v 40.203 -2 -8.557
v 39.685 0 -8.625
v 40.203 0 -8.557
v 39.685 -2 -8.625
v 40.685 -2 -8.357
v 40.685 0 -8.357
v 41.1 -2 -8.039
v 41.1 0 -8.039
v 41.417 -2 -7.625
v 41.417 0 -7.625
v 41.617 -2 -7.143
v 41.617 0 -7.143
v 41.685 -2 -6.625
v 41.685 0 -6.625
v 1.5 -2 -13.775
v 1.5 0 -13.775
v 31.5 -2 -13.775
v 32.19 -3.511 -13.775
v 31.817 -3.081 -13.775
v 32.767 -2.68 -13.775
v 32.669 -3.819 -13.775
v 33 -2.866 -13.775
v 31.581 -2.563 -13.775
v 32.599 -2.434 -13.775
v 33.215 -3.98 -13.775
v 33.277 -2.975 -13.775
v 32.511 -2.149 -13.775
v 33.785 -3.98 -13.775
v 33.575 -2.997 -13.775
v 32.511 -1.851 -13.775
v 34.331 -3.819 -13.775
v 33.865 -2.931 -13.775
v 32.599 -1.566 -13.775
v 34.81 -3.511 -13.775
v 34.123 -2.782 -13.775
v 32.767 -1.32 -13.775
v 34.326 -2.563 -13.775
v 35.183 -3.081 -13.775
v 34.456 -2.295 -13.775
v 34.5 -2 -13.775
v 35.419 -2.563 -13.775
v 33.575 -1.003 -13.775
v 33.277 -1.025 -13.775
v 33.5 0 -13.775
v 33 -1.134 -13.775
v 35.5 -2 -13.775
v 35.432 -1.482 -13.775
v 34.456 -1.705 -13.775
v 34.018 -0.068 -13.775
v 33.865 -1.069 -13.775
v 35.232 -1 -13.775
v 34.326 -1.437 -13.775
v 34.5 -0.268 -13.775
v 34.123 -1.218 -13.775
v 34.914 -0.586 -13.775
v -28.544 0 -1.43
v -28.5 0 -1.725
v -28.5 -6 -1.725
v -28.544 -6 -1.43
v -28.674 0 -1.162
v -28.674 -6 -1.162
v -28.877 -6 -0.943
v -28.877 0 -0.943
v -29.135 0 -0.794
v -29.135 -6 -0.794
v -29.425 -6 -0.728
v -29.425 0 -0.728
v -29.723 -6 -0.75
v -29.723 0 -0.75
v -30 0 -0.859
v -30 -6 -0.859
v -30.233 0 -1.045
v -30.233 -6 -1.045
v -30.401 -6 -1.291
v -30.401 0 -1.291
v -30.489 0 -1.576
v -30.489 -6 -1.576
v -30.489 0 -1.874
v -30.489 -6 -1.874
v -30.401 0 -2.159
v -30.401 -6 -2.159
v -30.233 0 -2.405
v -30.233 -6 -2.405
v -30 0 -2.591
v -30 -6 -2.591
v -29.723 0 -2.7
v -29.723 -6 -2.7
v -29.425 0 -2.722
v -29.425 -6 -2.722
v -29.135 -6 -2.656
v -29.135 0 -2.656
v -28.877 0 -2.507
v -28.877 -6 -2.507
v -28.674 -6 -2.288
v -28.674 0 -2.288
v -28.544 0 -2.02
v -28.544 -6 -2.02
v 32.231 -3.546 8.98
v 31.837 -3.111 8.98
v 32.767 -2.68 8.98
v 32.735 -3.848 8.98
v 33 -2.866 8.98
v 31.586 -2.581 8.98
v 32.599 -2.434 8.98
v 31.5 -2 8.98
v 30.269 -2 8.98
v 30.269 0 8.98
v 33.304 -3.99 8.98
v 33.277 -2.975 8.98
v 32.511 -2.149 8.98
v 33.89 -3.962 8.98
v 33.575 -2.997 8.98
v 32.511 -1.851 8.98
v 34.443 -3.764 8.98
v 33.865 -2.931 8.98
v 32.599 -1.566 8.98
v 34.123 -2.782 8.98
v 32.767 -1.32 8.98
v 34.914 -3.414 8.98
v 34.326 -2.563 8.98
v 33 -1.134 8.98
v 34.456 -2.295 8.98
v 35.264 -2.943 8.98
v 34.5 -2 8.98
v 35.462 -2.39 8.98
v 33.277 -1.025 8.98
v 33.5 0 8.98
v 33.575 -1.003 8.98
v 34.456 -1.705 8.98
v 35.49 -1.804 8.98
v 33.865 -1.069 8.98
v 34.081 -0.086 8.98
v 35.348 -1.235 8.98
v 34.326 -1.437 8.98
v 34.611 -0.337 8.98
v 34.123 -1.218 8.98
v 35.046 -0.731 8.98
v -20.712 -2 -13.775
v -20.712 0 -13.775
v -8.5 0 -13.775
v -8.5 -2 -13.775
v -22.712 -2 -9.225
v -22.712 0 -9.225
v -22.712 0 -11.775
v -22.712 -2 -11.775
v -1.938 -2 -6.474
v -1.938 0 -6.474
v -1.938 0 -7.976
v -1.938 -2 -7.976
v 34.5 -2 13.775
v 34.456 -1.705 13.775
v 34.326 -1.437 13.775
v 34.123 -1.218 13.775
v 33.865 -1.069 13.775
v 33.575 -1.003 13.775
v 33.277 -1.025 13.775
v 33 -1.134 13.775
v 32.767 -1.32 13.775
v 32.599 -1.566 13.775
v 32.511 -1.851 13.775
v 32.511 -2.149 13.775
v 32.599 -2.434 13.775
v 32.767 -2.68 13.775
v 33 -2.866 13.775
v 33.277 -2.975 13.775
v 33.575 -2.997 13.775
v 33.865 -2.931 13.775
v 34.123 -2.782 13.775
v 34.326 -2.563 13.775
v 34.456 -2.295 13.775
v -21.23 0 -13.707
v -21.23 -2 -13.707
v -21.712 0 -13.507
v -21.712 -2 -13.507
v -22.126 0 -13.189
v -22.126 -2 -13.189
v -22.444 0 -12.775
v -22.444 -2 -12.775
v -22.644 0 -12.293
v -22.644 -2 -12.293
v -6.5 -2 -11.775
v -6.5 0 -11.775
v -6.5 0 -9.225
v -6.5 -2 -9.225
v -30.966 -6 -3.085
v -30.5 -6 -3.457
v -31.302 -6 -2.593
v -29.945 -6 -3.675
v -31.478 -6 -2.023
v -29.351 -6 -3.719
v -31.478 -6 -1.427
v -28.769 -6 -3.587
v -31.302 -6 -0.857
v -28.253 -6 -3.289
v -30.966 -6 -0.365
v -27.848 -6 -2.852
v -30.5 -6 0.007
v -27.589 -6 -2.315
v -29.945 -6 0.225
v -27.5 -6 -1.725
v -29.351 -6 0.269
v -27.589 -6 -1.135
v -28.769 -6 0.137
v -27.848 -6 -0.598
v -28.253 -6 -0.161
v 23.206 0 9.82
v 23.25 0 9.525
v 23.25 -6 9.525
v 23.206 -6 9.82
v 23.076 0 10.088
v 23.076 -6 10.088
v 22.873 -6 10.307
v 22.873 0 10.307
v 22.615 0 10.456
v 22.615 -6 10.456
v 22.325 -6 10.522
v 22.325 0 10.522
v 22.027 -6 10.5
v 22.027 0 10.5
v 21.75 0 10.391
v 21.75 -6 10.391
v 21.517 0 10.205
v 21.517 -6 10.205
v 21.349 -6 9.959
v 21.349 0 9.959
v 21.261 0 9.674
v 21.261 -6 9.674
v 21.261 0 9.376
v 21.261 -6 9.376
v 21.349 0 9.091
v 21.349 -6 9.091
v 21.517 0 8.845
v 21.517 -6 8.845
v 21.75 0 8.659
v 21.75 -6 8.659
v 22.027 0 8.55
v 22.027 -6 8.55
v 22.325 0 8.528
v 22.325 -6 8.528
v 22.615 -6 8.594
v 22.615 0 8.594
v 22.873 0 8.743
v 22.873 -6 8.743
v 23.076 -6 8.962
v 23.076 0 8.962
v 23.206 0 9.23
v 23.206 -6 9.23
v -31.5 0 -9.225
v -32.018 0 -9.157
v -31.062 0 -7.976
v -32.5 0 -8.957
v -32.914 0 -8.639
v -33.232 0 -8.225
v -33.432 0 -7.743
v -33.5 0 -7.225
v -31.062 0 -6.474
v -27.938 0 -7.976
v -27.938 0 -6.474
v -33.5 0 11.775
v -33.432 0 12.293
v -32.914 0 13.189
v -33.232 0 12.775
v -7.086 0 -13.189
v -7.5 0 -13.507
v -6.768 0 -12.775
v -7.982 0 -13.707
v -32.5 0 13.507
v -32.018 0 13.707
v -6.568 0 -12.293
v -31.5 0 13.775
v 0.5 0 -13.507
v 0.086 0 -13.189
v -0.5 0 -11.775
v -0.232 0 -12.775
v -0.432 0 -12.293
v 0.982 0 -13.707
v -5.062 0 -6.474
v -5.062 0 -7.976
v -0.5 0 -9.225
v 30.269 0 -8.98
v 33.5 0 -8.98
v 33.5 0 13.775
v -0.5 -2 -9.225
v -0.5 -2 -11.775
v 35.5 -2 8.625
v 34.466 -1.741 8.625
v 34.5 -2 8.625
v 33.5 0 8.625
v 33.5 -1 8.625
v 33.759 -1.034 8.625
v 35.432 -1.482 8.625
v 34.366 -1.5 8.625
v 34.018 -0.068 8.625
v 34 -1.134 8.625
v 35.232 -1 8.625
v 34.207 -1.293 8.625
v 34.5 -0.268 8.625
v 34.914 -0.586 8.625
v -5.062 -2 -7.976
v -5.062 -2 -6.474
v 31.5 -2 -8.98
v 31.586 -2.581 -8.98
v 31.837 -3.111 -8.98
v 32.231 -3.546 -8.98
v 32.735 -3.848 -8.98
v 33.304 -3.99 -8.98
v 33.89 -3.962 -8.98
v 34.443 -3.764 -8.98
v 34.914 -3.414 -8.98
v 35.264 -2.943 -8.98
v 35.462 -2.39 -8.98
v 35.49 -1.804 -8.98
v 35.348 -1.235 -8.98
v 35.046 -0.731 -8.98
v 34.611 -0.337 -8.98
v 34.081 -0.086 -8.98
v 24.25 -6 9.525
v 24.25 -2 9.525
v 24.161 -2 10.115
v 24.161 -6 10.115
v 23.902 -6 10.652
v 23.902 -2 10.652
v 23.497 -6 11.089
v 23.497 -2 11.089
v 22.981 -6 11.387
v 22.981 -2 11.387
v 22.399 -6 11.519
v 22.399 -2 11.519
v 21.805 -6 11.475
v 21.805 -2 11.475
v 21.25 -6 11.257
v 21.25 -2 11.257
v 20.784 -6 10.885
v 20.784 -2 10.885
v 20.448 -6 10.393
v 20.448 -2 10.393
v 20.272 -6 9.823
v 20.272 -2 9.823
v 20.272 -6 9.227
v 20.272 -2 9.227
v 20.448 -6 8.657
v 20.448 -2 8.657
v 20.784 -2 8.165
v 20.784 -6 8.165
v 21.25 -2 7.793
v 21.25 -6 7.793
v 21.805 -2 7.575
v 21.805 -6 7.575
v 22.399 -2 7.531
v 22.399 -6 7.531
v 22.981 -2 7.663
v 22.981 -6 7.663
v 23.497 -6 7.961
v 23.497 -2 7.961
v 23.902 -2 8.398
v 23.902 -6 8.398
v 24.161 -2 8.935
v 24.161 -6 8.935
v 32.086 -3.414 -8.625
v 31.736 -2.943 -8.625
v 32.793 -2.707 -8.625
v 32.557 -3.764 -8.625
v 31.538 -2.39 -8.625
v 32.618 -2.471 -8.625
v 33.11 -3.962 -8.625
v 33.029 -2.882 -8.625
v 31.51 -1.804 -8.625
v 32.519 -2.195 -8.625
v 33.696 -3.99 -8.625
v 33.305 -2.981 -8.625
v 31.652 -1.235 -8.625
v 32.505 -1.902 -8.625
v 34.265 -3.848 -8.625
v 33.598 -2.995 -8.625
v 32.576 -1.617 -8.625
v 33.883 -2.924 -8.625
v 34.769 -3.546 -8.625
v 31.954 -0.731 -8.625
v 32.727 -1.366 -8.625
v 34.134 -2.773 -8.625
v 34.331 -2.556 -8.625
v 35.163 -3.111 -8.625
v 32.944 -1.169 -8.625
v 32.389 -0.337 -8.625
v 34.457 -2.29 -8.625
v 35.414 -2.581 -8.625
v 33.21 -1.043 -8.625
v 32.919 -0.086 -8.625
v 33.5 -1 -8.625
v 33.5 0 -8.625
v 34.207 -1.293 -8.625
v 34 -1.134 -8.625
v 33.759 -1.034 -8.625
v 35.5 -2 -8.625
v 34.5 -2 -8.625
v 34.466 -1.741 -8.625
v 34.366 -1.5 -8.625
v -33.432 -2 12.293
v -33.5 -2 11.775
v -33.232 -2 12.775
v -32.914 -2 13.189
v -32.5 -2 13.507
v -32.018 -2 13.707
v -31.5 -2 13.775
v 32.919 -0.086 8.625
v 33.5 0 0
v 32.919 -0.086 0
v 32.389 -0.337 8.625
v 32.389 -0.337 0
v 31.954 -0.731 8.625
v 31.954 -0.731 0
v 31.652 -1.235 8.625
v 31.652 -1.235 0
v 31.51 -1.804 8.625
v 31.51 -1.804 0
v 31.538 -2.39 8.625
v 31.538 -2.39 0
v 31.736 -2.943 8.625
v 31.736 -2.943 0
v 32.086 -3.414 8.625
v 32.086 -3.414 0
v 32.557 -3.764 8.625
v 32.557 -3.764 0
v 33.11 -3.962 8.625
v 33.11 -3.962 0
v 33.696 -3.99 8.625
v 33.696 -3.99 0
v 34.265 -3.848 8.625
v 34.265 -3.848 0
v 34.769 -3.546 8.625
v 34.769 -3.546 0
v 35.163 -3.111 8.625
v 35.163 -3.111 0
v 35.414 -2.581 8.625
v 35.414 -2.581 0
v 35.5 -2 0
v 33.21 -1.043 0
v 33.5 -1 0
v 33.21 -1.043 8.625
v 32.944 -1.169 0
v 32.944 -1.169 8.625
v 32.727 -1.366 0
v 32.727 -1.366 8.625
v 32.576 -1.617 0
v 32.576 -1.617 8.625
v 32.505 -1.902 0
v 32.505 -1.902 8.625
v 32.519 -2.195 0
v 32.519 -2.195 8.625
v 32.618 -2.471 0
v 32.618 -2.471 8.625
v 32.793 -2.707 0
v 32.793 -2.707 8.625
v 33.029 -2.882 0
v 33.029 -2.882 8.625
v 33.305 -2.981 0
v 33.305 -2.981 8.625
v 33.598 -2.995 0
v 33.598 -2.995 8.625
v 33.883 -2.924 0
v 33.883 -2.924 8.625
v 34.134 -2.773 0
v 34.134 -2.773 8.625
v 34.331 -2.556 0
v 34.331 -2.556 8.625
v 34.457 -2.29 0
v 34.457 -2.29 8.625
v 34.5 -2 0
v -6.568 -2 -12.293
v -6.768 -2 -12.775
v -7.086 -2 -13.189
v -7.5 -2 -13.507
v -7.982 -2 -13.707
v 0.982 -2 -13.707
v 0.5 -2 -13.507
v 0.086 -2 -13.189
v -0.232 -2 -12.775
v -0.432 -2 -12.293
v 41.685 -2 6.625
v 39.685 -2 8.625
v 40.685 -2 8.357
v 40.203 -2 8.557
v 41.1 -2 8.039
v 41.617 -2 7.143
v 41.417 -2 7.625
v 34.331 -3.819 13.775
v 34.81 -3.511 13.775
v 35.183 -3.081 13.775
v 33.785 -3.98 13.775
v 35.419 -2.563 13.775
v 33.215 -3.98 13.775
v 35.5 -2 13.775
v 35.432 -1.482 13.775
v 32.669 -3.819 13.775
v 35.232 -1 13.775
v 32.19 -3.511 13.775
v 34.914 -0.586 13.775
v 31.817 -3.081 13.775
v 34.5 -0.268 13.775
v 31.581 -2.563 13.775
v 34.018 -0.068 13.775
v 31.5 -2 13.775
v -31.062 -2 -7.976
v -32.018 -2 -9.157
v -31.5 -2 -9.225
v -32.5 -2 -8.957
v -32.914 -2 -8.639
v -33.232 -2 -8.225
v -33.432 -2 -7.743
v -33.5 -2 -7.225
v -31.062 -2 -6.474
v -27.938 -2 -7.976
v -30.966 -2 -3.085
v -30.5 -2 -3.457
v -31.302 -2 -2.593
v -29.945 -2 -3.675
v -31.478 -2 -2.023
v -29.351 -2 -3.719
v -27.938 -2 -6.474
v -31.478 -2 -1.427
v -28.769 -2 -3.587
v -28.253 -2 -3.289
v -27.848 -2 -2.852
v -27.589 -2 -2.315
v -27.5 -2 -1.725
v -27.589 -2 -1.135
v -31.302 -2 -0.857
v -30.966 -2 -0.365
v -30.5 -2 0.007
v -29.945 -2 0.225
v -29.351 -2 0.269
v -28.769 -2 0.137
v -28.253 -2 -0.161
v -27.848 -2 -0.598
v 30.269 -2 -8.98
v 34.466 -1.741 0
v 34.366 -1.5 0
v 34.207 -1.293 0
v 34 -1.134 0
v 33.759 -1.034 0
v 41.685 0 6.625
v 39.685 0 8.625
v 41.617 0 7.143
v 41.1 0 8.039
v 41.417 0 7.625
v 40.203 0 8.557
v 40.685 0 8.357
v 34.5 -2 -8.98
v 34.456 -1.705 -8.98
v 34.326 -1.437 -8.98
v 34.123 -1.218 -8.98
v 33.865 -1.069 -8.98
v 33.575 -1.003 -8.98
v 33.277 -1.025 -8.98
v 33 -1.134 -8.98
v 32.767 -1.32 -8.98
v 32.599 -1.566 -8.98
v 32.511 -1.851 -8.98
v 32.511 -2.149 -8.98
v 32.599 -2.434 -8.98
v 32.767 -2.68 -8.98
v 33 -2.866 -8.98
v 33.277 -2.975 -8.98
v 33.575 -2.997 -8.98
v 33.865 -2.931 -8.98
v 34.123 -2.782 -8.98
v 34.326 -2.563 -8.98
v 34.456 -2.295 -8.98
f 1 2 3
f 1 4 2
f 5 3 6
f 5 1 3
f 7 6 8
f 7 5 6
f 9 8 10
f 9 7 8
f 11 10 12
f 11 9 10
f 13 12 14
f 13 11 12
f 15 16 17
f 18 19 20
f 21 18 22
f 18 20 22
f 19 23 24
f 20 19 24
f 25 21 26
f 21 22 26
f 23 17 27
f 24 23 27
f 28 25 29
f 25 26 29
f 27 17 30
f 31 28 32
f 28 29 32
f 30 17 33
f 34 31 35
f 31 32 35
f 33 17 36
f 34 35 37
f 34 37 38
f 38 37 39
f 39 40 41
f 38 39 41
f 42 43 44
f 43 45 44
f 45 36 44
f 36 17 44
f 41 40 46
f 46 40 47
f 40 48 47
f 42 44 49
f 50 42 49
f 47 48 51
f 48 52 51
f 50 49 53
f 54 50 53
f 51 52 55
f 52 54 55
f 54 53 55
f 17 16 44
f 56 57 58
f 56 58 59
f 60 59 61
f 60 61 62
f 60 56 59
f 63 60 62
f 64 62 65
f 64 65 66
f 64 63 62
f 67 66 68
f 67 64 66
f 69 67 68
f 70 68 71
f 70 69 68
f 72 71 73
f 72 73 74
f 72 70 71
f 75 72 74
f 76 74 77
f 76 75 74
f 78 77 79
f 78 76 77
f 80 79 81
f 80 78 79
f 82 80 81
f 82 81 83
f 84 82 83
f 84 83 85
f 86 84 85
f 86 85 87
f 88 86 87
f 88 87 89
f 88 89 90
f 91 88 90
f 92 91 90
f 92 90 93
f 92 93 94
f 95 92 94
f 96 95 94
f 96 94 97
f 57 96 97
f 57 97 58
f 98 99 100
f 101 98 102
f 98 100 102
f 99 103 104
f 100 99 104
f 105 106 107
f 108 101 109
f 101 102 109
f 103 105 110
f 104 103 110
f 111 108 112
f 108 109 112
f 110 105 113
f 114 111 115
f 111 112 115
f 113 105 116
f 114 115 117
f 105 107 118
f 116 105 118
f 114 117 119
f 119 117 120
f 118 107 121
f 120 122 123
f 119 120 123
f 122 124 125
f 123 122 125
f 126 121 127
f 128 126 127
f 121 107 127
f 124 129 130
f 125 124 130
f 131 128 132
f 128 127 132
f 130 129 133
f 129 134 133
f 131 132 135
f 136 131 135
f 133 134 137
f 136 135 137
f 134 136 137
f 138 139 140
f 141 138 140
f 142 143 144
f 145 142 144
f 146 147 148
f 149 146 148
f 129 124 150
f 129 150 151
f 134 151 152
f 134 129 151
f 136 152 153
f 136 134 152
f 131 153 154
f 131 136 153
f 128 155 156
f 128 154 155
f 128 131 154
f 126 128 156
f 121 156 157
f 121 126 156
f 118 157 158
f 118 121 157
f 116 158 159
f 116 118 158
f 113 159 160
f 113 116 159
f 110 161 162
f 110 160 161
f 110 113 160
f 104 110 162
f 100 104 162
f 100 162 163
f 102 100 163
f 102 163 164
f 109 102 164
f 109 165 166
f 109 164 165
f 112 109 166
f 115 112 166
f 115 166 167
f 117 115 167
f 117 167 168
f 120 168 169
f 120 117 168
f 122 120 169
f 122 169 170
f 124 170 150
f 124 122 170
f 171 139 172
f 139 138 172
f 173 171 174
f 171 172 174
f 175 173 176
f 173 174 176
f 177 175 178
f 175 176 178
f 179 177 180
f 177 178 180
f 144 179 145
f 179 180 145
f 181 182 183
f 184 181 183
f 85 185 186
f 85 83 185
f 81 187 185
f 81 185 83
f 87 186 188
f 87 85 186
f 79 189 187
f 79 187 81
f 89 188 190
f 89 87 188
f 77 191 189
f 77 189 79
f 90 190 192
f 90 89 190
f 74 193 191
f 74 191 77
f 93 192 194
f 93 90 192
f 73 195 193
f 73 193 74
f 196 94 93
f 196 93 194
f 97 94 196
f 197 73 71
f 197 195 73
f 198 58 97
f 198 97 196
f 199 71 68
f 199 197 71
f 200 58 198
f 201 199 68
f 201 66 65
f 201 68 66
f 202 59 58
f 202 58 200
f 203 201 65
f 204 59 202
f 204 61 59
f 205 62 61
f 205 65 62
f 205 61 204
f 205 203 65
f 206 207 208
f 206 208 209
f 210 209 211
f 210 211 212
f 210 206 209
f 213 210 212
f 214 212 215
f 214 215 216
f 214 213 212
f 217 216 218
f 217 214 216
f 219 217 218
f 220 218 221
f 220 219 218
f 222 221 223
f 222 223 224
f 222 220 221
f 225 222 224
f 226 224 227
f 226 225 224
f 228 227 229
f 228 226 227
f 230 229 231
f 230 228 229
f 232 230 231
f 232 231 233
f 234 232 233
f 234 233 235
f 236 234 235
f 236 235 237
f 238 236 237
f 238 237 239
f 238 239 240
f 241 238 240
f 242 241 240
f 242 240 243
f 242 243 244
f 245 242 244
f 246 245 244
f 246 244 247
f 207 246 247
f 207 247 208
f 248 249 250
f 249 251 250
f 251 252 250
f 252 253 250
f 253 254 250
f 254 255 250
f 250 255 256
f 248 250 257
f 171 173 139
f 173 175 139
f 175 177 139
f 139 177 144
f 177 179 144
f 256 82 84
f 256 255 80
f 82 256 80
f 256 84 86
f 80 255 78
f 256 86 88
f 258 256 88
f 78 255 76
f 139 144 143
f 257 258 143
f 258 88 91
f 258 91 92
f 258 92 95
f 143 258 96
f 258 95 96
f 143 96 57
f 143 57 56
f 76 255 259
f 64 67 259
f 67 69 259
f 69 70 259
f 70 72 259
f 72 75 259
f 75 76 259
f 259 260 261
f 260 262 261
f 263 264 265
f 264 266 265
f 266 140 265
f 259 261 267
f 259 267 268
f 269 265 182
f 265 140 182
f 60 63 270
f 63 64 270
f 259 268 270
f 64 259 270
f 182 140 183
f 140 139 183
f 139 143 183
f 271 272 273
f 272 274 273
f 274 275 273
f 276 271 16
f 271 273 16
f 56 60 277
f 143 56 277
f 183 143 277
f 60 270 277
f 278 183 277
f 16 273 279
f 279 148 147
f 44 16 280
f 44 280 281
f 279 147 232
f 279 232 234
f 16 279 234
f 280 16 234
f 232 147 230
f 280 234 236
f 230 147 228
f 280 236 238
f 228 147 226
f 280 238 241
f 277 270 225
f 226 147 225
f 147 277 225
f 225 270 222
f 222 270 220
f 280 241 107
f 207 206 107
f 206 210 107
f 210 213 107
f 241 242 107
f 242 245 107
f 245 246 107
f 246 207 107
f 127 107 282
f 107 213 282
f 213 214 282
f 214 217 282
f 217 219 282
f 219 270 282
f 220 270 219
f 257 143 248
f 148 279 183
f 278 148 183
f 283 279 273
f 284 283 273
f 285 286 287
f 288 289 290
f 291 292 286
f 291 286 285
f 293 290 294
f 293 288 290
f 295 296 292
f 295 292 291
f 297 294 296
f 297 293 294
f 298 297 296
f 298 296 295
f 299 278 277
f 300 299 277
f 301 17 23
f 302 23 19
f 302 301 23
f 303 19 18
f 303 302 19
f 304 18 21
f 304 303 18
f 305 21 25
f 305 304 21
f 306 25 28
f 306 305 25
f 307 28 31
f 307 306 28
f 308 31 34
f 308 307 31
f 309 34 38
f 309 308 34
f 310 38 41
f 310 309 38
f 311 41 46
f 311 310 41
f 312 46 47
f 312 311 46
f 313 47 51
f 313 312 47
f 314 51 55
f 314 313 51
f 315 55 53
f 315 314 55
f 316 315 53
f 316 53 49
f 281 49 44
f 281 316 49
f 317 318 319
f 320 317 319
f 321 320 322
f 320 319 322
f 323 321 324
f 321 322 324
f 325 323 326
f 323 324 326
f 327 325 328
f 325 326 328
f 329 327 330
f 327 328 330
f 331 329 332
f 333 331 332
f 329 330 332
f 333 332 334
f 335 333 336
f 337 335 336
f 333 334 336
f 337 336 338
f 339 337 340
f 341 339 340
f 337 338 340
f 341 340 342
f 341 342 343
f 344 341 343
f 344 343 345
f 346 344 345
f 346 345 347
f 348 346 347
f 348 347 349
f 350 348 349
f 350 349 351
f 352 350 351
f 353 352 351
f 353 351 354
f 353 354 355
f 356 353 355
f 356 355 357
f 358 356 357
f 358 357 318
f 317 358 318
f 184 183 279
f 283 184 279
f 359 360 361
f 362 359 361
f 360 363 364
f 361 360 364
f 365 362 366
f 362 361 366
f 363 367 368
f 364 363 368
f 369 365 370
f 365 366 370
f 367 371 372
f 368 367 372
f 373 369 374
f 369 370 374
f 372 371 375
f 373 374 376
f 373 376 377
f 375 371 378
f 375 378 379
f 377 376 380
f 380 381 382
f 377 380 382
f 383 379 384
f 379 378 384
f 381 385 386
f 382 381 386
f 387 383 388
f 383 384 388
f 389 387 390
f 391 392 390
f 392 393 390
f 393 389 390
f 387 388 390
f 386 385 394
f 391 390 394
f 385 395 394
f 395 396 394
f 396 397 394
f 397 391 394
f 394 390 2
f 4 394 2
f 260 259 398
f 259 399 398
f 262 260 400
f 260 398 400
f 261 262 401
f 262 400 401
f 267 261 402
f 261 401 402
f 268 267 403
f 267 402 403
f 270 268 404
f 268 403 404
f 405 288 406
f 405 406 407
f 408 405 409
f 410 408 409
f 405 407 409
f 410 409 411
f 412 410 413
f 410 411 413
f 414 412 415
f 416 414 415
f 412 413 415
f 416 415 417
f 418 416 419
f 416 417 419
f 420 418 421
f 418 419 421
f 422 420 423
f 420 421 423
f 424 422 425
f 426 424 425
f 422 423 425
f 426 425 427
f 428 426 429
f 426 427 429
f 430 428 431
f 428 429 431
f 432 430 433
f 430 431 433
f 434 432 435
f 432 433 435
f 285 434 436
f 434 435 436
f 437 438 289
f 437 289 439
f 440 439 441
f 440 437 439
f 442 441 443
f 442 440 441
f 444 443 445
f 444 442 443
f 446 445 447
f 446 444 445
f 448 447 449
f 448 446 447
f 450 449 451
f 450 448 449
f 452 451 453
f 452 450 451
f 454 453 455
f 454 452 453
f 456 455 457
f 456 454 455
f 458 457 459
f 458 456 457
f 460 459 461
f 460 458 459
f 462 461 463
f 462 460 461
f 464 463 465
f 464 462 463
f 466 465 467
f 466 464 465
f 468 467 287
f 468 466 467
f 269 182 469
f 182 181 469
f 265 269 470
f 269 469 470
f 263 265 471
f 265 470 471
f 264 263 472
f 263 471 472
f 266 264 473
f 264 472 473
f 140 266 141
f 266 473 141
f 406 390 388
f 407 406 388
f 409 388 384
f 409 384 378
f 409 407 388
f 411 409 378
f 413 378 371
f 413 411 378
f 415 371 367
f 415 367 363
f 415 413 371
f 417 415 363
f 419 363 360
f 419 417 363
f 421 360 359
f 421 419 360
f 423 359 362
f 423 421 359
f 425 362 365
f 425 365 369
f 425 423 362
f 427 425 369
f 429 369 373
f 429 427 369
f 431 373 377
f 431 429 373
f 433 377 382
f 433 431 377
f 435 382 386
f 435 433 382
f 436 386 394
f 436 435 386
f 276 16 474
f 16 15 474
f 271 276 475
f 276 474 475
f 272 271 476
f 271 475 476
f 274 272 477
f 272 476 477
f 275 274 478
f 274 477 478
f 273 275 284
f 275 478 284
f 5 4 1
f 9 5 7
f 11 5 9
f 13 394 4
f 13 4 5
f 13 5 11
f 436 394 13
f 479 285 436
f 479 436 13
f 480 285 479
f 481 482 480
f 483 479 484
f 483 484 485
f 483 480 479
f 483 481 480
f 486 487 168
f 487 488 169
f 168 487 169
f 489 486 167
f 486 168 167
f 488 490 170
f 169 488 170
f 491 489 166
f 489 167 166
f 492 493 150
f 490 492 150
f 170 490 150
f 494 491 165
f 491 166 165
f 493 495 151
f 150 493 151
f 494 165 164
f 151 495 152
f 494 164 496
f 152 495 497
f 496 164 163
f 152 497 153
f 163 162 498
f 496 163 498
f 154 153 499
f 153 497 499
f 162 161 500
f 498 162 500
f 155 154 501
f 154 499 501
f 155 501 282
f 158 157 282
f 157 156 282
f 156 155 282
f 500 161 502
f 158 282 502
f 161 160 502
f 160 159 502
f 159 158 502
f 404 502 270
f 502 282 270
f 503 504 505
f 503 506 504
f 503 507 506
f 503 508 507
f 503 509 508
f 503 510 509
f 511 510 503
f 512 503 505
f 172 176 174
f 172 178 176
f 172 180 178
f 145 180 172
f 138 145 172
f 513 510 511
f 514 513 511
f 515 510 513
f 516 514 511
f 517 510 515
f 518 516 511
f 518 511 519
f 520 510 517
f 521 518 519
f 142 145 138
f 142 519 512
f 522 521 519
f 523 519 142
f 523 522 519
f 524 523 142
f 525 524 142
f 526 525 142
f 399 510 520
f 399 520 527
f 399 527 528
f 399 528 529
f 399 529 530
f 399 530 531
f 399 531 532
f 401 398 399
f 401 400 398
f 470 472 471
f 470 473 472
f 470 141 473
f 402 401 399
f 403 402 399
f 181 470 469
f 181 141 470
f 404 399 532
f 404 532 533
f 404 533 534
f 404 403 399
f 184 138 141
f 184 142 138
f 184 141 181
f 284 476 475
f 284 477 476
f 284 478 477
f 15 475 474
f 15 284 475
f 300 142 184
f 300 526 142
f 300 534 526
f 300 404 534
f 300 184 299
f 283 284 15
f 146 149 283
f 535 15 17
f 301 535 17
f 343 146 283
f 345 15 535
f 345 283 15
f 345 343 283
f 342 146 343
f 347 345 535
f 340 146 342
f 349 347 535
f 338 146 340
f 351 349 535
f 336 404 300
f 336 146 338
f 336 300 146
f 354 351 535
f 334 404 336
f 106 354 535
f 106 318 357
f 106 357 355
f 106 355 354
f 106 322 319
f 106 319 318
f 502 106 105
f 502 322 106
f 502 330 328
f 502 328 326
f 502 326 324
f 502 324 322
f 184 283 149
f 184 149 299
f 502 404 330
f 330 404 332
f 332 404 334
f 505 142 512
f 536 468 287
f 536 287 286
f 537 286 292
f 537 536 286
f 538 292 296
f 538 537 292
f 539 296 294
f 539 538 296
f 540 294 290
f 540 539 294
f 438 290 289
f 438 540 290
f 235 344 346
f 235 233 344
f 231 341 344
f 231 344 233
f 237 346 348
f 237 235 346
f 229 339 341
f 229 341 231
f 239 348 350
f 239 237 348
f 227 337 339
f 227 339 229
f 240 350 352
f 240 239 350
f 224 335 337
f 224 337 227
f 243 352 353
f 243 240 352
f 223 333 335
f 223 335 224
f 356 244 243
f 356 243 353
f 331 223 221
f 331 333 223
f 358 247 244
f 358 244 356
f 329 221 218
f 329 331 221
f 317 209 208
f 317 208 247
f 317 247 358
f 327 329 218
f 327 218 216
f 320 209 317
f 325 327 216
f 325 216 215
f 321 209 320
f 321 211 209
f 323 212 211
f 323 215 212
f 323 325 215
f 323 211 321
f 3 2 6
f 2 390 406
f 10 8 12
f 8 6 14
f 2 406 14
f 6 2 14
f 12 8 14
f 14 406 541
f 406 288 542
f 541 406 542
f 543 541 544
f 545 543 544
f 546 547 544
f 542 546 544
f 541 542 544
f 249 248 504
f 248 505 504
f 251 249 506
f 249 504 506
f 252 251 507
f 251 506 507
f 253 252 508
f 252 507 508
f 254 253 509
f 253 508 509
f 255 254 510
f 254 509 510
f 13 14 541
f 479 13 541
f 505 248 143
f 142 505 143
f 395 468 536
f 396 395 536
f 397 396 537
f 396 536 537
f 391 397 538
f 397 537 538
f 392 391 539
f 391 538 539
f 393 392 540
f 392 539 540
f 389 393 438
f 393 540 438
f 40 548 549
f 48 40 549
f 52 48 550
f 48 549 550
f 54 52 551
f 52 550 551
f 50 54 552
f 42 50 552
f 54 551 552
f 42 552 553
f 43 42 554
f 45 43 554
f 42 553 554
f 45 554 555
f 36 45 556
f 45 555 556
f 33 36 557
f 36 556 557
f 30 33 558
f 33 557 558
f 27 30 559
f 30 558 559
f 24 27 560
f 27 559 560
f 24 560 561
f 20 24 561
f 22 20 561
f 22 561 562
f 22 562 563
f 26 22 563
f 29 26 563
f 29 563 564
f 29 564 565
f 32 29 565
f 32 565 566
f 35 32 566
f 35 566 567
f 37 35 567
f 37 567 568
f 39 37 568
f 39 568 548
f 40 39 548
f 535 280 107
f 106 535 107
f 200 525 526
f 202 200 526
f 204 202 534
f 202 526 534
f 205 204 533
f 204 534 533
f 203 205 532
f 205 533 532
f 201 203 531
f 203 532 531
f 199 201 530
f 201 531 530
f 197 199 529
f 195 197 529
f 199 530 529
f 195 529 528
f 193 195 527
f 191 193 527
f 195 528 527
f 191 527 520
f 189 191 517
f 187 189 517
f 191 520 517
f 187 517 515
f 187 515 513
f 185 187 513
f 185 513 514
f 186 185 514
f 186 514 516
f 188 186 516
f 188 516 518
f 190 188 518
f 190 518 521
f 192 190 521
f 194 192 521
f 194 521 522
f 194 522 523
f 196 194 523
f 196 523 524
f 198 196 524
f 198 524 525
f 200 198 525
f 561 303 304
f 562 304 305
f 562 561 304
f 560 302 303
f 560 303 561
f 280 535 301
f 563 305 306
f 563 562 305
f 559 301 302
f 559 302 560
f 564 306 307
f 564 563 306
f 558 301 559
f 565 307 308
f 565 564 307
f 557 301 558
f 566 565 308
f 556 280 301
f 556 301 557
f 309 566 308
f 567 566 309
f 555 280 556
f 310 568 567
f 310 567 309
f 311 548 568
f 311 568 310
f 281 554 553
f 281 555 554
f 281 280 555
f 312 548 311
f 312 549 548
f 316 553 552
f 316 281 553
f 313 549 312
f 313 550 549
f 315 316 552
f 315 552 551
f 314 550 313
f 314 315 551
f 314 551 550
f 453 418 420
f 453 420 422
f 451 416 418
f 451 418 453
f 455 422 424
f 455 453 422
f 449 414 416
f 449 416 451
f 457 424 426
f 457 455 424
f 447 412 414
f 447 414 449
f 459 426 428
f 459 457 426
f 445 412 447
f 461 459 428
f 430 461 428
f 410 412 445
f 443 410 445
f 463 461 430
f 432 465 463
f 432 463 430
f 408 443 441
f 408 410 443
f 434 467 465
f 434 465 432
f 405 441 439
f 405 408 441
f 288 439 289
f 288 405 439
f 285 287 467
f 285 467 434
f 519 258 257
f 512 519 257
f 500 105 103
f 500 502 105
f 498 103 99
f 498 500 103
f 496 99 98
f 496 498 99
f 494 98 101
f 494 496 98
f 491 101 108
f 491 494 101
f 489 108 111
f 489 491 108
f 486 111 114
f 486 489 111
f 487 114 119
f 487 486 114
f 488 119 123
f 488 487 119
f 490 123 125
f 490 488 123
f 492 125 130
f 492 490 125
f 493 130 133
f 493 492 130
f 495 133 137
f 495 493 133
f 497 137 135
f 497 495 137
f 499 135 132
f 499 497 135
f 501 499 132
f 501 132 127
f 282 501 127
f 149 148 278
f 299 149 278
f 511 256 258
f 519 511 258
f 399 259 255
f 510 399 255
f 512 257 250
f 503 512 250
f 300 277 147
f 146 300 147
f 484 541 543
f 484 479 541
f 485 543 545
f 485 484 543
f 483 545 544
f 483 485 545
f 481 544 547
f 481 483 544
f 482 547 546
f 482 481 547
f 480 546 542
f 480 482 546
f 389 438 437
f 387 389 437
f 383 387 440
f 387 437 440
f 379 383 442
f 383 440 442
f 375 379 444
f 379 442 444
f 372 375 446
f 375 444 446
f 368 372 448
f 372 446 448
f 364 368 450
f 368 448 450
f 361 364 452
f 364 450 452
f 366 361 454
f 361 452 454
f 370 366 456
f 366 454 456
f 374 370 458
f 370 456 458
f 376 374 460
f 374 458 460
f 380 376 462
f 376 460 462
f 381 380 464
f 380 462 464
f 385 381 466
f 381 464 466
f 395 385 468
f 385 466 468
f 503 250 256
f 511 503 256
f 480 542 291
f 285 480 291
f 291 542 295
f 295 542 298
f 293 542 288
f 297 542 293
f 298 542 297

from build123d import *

# Parameters (mm, degrees)
F0_R           = 2
F0_W           = 9
F0_H           = 21
F0_R_2         = 1
F0_H_2         = 6.55
F1_DEPTH       = 2
F2_DEPTH       = 6
F3_R           = 1
F4_DEPTH       = 13.775
F4_DEPTH_BACK  = 13.775
F5_W           = 10.4610943198
F5_H           = 17.9593805224
F6_DEPTH       = 6
F7_DEPTH       = 8.625
F9_DEPTH       = 2
F10_DEPTH      = 13.776
F10_DEPTH_BACK = 13.776
F11_R          = 2
F11_2_R        = 2


with BuildPart() as f1:
    # F0 (on Front) → F1 (new body)
    with BuildSketch(Plane.XZ):
        Polygon((-0.5, -13.775), (24.5, -13.775), (24.5, -7.225), (-1.9384069145, -7.225), (-1.9384069145, -7.9757804051), (-5.0615930855, -7.9757804051), (-5.0615930855, -7.225), (-27.9384069145, -7.225), (-27.9384069145, -7.9757804051), (-31.0615930855, -7.9757804051), (-31.0615930855, -7.225), (-33.5, -7.225), (-33.5, -9.225), (-22.7120630443, -9.225), (-22.7120630443, -13.775), (-6.5, -13.775), (-6.5, -9.225), (-0.5, -9.225), align=None)
        Polygon((-1.9384069145, -7.225), (24.5, -7.225), (24.5, 13.775), (-33.5, 13.775), (-33.5, -7.225), (-31.0615930855, -7.225), (-31.0615930855, -6.4742195949), (-27.9384069145, -6.4742195949), (-27.9384069145, -7.225), (-5.0615930855, -7.225), (-5.0615930855, -6.4742195949), (-1.9384069145, -6.4742195949), align=None)
        with Locations((-29.5, -1.725)):
            Circle(F0_R, mode=Mode.SUBTRACT)
        with Locations((22.25, 9.525)):
            Circle(F0_R, mode=Mode.SUBTRACT)
        with Locations((29, 3.275)):
            Rectangle(F0_W, F0_H)
        with Locations((22.25, 9.525)):
            Circle(F0_R)
        with Locations((22.25, 9.525)):
            Circle(F0_R_2, mode=Mode.SUBTRACT)
        with Locations((-29.5, -1.725)):
            Circle(F0_R)
        with Locations((-29.5, -1.725)):
            Circle(F0_R_2, mode=Mode.SUBTRACT)
        with Locations((29, -10.5)):
            Rectangle(F0_W, F0_H_2)
    extrude(amount=F1_DEPTH)

    # F0 (on Front) → F2 (join)
    with BuildSketch(Plane.XZ):
        with Locations((-29.5, -1.725)):
            Circle(F0_R)
        with Locations((-29.5, -1.725)):
            Circle(F0_R_2, mode=Mode.SUBTRACT)
        with Locations((22.25, 9.525)):
            Circle(F0_R)
        with Locations((22.25, 9.525)):
            Circle(F0_R_2, mode=Mode.SUBTRACT)
    extrude(amount=F2_DEPTH)

    # F3 (on Top) → F4 (join, two sides)
    with BuildSketch(Plane.XY) as f4_sk:
        with BuildLine():
            ThreePointArc((33.5, 0), (32.0857864376, -3.4142135624), (35.5, -2))
            ThreePointArc((35.5, -2), (34.9142135624, -0.5857864376), (33.5, 0))
        make_face()
        with Locations((33.5, -2)):
            Circle(F3_R, mode=Mode.SUBTRACT)
        with Locations((33.5, -2)):
            Circle(F3_R)
    extrude(amount=F4_DEPTH)
    extrude(f4_sk.sketch, amount=-F4_DEPTH_BACK)

    # F5 (on Front) → F6 (cut)
    with BuildSketch(Plane.XZ):
        with Locations((35.5, 0)):
            Rectangle(F5_W, F5_H)
    extrude(amount=F6_DEPTH, mode=Mode.SUBTRACT)


with BuildPart() as f7:
    # F3 (on Top) → F7 (new body, symmetric)
    with BuildSketch(Plane.XY):
        with BuildLine():
            ThreePointArc((33.5, 0), (32.0857864376, -3.4142135624), (35.5, -2))
            ThreePointArc((35.5, -2), (34.9142135624, -0.5857864376), (33.5, 0))
        make_face()
        with Locations((33.5, -2)):
            Circle(F3_R, mode=Mode.SUBTRACT)
    extrude(amount=F7_DEPTH, both=True)

    # F8 (on Front) → F9 (join, through all)
    with BuildSketch(Plane.XZ):
        Polygon((35.5, 8.625), (33.5, 8.625), (33.5, -8.625), (35.5, -8.625), (41.6854098439, -8.625), (41.6854098439, 8.625), align=None)
    extrude(amount=F9_DEPTH)


with BuildPart() as f10_tool:
    # F3 (on Top) → F10 (new body, two sides)
    with BuildSketch(Plane.XY) as f10_sk:
        with Locations((33.5, -2)):
            Circle(F3_R)
    extrude(amount=-F10_DEPTH)
    extrude(f10_sk.sketch, amount=F10_DEPTH_BACK)


with BuildPart() as f1_1:
    add(f1.part)

    # F10: cut by f10_tool
    add(f10_tool.part, mode=Mode.SUBTRACT)

    # F11
    f11_edges = [f1_1.edges().sort_by_distance(p)[0] for p in [
        (-33.5, -1, -9.225),
        (-33.5, -1, 13.775),
        (-22.712063, -1, -13.775),
        (-6.5, -1, -13.775),
        (-0.5, -1, -13.775),
    ]]
    fillet(f11_edges, radius=F11_R)


with BuildPart() as f7_1:
    add(f7.part)

    # F10: cut by f10_tool
    add(f10_tool.part, mode=Mode.SUBTRACT)

    # F11#2
    f11_2_edges = [f7_1.edges().sort_by_distance(p)[0] for p in [
        (41.68541, -1, -8.625),
        (41.68541, -1, 8.625),
    ]]
    fillet(f11_2_edges, radius=F11_2_R)


solid = Compound([f1_1.part, f7_1.part])
